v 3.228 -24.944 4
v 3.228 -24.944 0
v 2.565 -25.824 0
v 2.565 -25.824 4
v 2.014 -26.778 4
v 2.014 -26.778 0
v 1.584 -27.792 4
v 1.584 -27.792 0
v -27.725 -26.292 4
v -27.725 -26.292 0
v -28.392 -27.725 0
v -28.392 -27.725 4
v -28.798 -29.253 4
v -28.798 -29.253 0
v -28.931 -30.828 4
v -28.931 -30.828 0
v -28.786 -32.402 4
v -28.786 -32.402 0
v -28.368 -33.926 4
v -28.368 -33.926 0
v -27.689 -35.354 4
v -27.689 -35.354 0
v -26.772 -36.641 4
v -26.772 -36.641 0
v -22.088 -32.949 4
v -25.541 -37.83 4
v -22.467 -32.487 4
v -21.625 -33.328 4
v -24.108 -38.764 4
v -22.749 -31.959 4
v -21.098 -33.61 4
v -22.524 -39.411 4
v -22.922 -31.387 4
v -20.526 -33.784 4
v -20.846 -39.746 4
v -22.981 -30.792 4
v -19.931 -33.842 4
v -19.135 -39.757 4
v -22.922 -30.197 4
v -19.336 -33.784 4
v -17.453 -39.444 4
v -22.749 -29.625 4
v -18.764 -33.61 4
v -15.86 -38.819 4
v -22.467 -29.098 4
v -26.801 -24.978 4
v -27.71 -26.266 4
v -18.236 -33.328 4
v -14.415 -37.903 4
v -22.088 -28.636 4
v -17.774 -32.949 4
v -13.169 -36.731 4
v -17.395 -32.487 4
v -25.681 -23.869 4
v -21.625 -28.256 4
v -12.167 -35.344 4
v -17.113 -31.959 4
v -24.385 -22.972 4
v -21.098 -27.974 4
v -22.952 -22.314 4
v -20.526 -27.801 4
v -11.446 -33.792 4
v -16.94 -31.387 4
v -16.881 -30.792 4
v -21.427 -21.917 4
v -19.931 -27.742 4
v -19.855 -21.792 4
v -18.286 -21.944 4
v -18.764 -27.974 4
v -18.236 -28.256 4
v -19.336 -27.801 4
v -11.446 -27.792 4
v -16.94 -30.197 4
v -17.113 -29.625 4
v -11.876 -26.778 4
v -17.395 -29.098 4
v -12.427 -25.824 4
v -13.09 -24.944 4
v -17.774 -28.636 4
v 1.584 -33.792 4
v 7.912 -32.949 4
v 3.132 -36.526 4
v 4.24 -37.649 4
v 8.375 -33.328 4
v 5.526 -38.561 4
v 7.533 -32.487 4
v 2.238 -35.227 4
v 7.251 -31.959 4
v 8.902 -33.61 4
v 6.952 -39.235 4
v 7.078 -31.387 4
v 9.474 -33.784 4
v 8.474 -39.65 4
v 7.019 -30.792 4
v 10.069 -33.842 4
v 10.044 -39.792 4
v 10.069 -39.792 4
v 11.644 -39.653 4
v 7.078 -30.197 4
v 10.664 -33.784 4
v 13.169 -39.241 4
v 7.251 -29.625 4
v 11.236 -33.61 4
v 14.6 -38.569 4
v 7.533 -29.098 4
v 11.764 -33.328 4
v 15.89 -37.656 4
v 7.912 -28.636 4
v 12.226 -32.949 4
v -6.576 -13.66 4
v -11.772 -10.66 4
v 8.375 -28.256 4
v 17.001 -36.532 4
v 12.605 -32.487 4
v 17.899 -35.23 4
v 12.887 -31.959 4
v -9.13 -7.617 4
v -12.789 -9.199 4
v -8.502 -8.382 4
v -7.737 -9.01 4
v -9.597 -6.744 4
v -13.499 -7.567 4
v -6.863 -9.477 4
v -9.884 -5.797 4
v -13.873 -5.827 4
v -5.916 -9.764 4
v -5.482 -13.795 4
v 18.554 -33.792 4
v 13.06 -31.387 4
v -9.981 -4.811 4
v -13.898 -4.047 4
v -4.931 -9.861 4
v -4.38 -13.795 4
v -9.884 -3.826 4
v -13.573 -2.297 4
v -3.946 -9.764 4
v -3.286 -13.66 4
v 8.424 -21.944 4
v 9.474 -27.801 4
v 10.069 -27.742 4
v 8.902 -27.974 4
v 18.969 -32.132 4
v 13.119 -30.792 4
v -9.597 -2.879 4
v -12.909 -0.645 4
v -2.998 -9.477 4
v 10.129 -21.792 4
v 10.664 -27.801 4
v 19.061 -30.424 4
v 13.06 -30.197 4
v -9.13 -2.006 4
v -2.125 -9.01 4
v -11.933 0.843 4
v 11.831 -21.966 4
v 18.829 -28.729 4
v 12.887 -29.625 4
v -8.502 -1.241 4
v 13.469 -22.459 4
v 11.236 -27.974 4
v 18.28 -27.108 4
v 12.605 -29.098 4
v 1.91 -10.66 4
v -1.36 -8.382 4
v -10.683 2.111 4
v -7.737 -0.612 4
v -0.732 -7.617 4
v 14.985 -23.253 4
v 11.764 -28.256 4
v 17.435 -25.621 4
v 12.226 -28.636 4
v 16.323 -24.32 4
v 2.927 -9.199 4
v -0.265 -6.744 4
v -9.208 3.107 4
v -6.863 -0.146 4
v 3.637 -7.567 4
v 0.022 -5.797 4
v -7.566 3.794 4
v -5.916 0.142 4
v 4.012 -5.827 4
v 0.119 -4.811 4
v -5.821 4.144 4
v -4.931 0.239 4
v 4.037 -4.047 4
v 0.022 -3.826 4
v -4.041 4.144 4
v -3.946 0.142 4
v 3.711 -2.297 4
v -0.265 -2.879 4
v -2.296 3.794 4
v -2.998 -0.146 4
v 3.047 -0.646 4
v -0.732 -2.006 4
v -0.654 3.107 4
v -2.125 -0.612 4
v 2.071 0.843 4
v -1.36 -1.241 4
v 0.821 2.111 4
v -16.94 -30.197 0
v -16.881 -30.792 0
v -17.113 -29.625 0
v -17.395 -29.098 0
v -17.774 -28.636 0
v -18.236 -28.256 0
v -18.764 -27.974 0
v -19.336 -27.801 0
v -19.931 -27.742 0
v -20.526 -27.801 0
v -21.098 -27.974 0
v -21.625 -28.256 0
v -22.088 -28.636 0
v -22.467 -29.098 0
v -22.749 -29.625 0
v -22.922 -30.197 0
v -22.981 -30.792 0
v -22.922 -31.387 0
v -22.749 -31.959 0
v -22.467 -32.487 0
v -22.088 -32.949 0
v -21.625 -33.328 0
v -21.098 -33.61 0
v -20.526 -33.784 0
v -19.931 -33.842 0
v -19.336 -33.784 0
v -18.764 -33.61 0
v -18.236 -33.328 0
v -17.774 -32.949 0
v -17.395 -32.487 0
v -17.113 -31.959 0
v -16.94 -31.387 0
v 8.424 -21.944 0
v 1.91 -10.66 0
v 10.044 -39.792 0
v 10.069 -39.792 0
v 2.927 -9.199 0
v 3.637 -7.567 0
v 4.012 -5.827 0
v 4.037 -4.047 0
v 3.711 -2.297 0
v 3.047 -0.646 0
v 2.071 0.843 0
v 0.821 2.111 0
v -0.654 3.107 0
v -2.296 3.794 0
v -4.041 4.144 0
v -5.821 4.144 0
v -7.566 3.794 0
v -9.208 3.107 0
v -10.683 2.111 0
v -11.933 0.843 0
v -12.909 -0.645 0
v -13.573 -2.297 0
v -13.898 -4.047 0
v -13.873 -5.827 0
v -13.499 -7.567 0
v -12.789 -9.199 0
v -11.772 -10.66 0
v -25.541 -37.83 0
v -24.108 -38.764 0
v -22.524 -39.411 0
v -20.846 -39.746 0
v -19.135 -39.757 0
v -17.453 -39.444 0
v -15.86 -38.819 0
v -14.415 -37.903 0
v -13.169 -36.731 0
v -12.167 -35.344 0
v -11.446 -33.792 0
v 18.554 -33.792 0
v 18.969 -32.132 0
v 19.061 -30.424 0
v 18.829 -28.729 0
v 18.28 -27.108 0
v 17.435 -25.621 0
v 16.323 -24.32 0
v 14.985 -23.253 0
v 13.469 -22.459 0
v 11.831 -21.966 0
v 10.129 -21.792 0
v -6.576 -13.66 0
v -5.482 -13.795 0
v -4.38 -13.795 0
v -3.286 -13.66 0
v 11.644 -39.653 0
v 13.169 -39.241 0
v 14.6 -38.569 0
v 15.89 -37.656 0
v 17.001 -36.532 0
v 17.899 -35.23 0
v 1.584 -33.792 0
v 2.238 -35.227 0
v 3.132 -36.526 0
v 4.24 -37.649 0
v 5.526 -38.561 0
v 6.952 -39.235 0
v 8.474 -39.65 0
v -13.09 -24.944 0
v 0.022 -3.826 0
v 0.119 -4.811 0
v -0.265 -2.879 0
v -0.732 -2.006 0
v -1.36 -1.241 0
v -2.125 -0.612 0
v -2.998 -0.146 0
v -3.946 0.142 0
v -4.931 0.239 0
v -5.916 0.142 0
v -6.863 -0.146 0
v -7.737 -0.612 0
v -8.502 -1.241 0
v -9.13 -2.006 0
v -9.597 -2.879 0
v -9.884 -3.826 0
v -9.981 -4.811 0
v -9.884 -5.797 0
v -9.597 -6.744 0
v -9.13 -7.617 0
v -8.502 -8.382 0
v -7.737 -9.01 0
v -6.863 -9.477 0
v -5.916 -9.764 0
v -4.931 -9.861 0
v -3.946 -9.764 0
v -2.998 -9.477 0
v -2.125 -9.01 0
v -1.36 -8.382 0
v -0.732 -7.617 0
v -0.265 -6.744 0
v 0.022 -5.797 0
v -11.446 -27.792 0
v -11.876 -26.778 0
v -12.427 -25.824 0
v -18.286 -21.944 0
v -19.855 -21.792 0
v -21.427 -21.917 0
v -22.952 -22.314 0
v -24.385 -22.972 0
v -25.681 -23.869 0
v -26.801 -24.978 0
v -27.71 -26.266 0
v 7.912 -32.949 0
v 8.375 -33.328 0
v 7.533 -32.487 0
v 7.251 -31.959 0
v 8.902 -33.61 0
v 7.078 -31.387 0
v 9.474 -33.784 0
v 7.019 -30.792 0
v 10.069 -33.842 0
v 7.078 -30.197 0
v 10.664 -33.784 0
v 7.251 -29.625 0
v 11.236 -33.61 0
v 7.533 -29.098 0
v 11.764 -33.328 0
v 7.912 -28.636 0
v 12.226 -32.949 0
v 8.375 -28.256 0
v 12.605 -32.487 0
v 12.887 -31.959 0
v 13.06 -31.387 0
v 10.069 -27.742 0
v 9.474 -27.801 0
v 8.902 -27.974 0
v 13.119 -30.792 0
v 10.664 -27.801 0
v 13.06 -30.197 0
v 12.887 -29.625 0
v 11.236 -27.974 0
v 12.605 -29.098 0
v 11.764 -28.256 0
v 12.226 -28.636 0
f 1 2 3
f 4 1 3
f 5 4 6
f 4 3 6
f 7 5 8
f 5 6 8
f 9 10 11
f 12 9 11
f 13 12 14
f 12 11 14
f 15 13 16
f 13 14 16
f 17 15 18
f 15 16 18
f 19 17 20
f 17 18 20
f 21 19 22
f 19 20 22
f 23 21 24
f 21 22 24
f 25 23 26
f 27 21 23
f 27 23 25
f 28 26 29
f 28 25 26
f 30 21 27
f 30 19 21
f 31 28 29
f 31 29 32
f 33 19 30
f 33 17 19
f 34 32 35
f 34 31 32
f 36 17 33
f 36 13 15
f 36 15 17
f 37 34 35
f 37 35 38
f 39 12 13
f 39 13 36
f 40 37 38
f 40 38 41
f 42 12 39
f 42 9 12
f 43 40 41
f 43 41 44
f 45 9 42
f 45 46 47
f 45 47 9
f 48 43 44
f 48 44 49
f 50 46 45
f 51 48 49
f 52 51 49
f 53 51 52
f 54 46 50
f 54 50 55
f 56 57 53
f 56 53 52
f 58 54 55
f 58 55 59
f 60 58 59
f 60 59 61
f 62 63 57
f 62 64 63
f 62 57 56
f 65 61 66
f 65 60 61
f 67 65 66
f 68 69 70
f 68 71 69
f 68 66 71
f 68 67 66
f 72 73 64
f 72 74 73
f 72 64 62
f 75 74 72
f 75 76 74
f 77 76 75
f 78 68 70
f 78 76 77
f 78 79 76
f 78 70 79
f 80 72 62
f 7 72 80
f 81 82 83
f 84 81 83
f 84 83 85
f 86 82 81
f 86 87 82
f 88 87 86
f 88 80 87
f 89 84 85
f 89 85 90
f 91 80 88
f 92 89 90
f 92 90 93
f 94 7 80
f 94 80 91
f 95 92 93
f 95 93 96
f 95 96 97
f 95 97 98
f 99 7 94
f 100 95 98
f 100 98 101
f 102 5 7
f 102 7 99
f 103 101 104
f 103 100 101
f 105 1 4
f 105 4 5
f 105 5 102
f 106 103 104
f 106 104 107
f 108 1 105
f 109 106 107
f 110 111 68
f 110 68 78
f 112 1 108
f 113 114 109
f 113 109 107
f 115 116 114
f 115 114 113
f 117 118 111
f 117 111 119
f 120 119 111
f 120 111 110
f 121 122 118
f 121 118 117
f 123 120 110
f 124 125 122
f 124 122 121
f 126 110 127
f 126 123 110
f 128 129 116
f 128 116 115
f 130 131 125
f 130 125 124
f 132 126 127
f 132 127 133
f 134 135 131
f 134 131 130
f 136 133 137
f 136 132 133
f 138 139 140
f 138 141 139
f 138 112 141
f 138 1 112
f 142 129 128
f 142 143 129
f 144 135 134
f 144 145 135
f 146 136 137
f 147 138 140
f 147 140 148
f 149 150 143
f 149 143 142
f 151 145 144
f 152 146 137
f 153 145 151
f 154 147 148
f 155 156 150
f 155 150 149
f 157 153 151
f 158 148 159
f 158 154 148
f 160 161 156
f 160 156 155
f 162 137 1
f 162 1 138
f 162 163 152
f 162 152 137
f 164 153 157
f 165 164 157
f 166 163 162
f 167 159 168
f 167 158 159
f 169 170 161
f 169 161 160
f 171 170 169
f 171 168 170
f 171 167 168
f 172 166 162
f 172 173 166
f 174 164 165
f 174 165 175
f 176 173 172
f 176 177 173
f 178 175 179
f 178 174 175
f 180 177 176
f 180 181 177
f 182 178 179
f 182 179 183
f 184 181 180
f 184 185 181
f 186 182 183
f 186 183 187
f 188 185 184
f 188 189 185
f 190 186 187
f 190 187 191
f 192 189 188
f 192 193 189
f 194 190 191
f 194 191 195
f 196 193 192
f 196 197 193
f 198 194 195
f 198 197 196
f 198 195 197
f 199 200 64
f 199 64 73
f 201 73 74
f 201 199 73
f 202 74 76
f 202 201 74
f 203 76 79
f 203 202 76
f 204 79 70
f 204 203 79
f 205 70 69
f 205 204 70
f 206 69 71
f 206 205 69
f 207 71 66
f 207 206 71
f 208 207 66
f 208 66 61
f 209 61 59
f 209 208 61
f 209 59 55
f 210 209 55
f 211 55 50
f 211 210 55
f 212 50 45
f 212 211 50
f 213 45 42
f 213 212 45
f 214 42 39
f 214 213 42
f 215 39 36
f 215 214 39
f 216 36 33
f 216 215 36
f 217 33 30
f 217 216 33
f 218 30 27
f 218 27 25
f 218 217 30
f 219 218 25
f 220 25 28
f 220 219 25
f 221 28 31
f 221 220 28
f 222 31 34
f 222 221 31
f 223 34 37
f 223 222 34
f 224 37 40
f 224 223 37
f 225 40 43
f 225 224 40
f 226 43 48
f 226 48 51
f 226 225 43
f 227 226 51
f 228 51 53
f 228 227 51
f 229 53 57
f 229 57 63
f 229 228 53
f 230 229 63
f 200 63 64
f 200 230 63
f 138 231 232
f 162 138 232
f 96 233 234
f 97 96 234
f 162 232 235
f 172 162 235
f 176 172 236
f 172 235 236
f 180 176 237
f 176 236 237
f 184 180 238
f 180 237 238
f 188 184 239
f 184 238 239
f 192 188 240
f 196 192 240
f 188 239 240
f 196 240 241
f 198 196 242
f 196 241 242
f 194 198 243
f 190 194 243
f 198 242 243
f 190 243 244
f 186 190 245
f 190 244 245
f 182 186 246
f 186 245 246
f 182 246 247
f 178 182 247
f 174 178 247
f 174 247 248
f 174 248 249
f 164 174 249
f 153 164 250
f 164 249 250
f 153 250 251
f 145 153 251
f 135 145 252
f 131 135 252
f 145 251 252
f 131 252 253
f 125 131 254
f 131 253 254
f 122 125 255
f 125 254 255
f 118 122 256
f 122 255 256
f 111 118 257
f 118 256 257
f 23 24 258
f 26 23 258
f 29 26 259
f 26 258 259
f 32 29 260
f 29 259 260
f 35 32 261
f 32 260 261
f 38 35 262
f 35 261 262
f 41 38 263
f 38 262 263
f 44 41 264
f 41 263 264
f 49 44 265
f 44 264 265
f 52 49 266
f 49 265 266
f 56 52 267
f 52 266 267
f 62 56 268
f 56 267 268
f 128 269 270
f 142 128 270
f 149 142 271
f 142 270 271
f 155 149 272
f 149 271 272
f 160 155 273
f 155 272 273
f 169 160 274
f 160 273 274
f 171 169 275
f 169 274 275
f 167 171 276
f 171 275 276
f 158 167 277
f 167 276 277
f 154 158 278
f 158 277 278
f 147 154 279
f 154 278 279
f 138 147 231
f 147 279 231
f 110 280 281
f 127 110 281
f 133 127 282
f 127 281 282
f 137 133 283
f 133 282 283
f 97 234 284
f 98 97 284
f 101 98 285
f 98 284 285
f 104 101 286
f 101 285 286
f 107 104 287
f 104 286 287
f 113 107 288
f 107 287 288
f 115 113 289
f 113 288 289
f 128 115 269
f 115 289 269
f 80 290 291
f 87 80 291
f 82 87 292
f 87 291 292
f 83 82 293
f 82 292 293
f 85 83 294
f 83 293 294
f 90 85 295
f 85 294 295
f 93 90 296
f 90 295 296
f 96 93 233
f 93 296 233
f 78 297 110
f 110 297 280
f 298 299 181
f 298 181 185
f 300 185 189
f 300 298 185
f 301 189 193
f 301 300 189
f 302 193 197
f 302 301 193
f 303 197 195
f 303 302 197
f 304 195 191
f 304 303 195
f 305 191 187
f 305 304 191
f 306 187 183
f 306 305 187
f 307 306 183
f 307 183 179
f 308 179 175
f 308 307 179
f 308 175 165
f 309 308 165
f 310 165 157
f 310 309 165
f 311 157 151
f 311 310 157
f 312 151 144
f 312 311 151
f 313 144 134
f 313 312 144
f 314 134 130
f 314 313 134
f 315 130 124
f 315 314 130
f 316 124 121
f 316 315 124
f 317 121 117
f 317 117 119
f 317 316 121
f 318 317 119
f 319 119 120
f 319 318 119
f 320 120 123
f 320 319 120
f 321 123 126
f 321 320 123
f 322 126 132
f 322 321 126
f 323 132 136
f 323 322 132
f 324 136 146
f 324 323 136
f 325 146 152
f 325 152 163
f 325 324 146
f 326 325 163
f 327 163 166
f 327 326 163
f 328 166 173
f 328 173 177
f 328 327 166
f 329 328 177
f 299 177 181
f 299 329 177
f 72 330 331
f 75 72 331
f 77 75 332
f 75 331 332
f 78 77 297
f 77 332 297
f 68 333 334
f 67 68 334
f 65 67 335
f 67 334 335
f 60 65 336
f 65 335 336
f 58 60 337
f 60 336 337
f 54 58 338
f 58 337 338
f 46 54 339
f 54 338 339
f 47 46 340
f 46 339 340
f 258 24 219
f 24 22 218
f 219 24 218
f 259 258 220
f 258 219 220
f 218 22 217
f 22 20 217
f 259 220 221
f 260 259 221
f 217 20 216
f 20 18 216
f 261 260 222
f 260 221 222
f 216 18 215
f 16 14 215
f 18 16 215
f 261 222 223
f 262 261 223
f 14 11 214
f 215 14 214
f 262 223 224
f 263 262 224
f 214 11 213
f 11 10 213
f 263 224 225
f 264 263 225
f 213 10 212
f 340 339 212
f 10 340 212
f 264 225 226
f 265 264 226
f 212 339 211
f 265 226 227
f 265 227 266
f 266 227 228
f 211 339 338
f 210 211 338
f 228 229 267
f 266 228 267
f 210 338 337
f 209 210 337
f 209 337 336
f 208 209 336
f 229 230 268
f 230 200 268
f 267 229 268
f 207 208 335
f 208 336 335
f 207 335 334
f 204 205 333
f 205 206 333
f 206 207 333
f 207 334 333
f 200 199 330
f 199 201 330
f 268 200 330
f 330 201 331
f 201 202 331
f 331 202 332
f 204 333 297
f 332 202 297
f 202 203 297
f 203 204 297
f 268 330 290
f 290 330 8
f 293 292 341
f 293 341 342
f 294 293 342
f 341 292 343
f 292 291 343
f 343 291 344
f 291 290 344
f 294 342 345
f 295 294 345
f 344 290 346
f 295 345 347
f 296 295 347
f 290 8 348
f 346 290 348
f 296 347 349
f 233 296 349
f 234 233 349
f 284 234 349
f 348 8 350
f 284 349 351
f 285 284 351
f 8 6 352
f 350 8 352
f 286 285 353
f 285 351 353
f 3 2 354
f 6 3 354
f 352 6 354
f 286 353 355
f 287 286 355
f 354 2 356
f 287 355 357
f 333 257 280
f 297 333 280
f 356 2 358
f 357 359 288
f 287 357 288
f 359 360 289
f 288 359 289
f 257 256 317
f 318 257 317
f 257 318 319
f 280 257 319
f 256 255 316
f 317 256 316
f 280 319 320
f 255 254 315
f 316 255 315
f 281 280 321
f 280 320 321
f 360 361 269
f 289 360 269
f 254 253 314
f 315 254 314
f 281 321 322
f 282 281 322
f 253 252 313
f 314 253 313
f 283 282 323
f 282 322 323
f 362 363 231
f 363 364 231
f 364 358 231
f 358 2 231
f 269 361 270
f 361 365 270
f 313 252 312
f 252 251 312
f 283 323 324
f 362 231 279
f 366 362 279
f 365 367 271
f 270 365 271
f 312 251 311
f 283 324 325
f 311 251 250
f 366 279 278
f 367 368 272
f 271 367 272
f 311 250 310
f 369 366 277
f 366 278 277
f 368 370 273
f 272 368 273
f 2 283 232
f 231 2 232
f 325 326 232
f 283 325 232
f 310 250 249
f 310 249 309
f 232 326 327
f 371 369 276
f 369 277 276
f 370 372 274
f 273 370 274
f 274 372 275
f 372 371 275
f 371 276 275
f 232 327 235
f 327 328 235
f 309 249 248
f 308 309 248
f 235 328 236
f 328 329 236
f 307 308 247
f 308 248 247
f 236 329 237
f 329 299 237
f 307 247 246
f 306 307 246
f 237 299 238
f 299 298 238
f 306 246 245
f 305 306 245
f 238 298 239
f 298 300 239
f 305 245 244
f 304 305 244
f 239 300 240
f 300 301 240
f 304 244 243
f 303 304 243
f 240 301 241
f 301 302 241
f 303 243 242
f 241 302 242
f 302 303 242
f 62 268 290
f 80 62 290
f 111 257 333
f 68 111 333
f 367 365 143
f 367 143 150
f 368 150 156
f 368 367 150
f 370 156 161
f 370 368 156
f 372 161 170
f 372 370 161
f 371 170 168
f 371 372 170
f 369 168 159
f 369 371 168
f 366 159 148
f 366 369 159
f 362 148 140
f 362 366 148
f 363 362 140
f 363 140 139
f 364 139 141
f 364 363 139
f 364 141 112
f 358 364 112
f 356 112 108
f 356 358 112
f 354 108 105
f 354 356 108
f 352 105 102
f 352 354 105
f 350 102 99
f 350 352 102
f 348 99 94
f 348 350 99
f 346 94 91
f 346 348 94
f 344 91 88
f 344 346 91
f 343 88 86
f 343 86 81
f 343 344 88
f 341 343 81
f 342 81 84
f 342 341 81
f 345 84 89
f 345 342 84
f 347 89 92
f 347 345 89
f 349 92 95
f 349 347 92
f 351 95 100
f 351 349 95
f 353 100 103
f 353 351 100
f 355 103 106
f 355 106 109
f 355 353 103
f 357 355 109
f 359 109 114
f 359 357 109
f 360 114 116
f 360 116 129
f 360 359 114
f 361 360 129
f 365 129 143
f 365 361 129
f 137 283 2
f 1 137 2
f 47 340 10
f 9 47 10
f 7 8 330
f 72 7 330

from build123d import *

# Parameters (mm, degrees)
SKETCH_1_R      = 3.05
SKETCH_1_R_2    = 5.05
EXTRUDE_1_DEPTH = 4


with BuildPart() as part:
    # 草图1 → 凸台-拉伸1 (new body)
    with BuildSketch(Plane.XY):
        with BuildLine():
            Line((8.424446615, -21.943763958), (1.909734407, -10.659930534))
            ThreePointArc((1.909734407, -10.659930534), (-4.930907825, 4.188585667), (-11.771663917, -10.659878079))
            Line((-11.771663917, -10.659878079), (-18.286394211, -21.943701062))
            ThreePointArc((-18.286394211, -21.943701062), (-23.683045573, -22.611553889), (-27.70998166, -26.265819763))
            Line((-27.70998166, -26.265819763), (-27.725209001, -26.292194242))
            ThreePointArc((-27.725209001, -26.292194242), (-28.893024381, -31.617931514), (-26.77174103, -36.640622744))
            ThreePointArc((-26.77174103, -36.640622744), (-18.28646206, -39.640629543), (-11.445740476, -33.792165797))
            Line((-11.445740476, -33.792165797), (1.583702026, -33.792176239))
            ThreePointArc((1.583702026, -33.792176239), (4.862729341, -38.133535764), (10.044259423, -39.792200488))
            Line((10.044259423, -39.792200488), (10.069016027, -39.792200488))
            ThreePointArc((10.069016027, -39.792200488), (15.265142091, -38.140688354), (18.55427588, -33.792261359))
            ThreePointArc((18.55427588, -33.792261359), (16.909732497, -24.943778842), (8.424446615, -21.943763958))
        make_face()
        with Locations((10.069016027, -30.792200488)):
            Circle(SKETCH_1_R, mode=Mode.SUBTRACT)
        with Locations((-4.930942332, -4.811414333)):
            Circle(SKETCH_1_R_2, mode=Mode.SUBTRACT)
        with Locations((-19.930983973, -30.792200488)):
            Circle(SKETCH_1_R, mode=Mode.SUBTRACT)
        with BuildLine():
            Line((-3.286438615, -13.659894854), (3.228291788, -24.943759794))
            ThreePointArc((3.228291788, -24.943759794), (2.274792619, -26.292204621), (1.583743226, -27.792176239))
            Line((1.583743226, -27.792176239), (-11.445735667, -27.792165797))
            ThreePointArc((-11.445735667, -27.792165797), (-12.136773559, -26.29218888), (-13.090262388, -24.943736742))
            Line((-13.090262388, -24.943736742), (-6.575513898, -13.659882243))
            ThreePointArc((-6.575513898, -13.659882243), (-4.930976838, -13.811414333), (-3.286438615, -13.659894854))
        make_face(mode=Mode.SUBTRACT)
    extrude(amount=EXTRUDE_1_DEPTH)


solid = part.part
